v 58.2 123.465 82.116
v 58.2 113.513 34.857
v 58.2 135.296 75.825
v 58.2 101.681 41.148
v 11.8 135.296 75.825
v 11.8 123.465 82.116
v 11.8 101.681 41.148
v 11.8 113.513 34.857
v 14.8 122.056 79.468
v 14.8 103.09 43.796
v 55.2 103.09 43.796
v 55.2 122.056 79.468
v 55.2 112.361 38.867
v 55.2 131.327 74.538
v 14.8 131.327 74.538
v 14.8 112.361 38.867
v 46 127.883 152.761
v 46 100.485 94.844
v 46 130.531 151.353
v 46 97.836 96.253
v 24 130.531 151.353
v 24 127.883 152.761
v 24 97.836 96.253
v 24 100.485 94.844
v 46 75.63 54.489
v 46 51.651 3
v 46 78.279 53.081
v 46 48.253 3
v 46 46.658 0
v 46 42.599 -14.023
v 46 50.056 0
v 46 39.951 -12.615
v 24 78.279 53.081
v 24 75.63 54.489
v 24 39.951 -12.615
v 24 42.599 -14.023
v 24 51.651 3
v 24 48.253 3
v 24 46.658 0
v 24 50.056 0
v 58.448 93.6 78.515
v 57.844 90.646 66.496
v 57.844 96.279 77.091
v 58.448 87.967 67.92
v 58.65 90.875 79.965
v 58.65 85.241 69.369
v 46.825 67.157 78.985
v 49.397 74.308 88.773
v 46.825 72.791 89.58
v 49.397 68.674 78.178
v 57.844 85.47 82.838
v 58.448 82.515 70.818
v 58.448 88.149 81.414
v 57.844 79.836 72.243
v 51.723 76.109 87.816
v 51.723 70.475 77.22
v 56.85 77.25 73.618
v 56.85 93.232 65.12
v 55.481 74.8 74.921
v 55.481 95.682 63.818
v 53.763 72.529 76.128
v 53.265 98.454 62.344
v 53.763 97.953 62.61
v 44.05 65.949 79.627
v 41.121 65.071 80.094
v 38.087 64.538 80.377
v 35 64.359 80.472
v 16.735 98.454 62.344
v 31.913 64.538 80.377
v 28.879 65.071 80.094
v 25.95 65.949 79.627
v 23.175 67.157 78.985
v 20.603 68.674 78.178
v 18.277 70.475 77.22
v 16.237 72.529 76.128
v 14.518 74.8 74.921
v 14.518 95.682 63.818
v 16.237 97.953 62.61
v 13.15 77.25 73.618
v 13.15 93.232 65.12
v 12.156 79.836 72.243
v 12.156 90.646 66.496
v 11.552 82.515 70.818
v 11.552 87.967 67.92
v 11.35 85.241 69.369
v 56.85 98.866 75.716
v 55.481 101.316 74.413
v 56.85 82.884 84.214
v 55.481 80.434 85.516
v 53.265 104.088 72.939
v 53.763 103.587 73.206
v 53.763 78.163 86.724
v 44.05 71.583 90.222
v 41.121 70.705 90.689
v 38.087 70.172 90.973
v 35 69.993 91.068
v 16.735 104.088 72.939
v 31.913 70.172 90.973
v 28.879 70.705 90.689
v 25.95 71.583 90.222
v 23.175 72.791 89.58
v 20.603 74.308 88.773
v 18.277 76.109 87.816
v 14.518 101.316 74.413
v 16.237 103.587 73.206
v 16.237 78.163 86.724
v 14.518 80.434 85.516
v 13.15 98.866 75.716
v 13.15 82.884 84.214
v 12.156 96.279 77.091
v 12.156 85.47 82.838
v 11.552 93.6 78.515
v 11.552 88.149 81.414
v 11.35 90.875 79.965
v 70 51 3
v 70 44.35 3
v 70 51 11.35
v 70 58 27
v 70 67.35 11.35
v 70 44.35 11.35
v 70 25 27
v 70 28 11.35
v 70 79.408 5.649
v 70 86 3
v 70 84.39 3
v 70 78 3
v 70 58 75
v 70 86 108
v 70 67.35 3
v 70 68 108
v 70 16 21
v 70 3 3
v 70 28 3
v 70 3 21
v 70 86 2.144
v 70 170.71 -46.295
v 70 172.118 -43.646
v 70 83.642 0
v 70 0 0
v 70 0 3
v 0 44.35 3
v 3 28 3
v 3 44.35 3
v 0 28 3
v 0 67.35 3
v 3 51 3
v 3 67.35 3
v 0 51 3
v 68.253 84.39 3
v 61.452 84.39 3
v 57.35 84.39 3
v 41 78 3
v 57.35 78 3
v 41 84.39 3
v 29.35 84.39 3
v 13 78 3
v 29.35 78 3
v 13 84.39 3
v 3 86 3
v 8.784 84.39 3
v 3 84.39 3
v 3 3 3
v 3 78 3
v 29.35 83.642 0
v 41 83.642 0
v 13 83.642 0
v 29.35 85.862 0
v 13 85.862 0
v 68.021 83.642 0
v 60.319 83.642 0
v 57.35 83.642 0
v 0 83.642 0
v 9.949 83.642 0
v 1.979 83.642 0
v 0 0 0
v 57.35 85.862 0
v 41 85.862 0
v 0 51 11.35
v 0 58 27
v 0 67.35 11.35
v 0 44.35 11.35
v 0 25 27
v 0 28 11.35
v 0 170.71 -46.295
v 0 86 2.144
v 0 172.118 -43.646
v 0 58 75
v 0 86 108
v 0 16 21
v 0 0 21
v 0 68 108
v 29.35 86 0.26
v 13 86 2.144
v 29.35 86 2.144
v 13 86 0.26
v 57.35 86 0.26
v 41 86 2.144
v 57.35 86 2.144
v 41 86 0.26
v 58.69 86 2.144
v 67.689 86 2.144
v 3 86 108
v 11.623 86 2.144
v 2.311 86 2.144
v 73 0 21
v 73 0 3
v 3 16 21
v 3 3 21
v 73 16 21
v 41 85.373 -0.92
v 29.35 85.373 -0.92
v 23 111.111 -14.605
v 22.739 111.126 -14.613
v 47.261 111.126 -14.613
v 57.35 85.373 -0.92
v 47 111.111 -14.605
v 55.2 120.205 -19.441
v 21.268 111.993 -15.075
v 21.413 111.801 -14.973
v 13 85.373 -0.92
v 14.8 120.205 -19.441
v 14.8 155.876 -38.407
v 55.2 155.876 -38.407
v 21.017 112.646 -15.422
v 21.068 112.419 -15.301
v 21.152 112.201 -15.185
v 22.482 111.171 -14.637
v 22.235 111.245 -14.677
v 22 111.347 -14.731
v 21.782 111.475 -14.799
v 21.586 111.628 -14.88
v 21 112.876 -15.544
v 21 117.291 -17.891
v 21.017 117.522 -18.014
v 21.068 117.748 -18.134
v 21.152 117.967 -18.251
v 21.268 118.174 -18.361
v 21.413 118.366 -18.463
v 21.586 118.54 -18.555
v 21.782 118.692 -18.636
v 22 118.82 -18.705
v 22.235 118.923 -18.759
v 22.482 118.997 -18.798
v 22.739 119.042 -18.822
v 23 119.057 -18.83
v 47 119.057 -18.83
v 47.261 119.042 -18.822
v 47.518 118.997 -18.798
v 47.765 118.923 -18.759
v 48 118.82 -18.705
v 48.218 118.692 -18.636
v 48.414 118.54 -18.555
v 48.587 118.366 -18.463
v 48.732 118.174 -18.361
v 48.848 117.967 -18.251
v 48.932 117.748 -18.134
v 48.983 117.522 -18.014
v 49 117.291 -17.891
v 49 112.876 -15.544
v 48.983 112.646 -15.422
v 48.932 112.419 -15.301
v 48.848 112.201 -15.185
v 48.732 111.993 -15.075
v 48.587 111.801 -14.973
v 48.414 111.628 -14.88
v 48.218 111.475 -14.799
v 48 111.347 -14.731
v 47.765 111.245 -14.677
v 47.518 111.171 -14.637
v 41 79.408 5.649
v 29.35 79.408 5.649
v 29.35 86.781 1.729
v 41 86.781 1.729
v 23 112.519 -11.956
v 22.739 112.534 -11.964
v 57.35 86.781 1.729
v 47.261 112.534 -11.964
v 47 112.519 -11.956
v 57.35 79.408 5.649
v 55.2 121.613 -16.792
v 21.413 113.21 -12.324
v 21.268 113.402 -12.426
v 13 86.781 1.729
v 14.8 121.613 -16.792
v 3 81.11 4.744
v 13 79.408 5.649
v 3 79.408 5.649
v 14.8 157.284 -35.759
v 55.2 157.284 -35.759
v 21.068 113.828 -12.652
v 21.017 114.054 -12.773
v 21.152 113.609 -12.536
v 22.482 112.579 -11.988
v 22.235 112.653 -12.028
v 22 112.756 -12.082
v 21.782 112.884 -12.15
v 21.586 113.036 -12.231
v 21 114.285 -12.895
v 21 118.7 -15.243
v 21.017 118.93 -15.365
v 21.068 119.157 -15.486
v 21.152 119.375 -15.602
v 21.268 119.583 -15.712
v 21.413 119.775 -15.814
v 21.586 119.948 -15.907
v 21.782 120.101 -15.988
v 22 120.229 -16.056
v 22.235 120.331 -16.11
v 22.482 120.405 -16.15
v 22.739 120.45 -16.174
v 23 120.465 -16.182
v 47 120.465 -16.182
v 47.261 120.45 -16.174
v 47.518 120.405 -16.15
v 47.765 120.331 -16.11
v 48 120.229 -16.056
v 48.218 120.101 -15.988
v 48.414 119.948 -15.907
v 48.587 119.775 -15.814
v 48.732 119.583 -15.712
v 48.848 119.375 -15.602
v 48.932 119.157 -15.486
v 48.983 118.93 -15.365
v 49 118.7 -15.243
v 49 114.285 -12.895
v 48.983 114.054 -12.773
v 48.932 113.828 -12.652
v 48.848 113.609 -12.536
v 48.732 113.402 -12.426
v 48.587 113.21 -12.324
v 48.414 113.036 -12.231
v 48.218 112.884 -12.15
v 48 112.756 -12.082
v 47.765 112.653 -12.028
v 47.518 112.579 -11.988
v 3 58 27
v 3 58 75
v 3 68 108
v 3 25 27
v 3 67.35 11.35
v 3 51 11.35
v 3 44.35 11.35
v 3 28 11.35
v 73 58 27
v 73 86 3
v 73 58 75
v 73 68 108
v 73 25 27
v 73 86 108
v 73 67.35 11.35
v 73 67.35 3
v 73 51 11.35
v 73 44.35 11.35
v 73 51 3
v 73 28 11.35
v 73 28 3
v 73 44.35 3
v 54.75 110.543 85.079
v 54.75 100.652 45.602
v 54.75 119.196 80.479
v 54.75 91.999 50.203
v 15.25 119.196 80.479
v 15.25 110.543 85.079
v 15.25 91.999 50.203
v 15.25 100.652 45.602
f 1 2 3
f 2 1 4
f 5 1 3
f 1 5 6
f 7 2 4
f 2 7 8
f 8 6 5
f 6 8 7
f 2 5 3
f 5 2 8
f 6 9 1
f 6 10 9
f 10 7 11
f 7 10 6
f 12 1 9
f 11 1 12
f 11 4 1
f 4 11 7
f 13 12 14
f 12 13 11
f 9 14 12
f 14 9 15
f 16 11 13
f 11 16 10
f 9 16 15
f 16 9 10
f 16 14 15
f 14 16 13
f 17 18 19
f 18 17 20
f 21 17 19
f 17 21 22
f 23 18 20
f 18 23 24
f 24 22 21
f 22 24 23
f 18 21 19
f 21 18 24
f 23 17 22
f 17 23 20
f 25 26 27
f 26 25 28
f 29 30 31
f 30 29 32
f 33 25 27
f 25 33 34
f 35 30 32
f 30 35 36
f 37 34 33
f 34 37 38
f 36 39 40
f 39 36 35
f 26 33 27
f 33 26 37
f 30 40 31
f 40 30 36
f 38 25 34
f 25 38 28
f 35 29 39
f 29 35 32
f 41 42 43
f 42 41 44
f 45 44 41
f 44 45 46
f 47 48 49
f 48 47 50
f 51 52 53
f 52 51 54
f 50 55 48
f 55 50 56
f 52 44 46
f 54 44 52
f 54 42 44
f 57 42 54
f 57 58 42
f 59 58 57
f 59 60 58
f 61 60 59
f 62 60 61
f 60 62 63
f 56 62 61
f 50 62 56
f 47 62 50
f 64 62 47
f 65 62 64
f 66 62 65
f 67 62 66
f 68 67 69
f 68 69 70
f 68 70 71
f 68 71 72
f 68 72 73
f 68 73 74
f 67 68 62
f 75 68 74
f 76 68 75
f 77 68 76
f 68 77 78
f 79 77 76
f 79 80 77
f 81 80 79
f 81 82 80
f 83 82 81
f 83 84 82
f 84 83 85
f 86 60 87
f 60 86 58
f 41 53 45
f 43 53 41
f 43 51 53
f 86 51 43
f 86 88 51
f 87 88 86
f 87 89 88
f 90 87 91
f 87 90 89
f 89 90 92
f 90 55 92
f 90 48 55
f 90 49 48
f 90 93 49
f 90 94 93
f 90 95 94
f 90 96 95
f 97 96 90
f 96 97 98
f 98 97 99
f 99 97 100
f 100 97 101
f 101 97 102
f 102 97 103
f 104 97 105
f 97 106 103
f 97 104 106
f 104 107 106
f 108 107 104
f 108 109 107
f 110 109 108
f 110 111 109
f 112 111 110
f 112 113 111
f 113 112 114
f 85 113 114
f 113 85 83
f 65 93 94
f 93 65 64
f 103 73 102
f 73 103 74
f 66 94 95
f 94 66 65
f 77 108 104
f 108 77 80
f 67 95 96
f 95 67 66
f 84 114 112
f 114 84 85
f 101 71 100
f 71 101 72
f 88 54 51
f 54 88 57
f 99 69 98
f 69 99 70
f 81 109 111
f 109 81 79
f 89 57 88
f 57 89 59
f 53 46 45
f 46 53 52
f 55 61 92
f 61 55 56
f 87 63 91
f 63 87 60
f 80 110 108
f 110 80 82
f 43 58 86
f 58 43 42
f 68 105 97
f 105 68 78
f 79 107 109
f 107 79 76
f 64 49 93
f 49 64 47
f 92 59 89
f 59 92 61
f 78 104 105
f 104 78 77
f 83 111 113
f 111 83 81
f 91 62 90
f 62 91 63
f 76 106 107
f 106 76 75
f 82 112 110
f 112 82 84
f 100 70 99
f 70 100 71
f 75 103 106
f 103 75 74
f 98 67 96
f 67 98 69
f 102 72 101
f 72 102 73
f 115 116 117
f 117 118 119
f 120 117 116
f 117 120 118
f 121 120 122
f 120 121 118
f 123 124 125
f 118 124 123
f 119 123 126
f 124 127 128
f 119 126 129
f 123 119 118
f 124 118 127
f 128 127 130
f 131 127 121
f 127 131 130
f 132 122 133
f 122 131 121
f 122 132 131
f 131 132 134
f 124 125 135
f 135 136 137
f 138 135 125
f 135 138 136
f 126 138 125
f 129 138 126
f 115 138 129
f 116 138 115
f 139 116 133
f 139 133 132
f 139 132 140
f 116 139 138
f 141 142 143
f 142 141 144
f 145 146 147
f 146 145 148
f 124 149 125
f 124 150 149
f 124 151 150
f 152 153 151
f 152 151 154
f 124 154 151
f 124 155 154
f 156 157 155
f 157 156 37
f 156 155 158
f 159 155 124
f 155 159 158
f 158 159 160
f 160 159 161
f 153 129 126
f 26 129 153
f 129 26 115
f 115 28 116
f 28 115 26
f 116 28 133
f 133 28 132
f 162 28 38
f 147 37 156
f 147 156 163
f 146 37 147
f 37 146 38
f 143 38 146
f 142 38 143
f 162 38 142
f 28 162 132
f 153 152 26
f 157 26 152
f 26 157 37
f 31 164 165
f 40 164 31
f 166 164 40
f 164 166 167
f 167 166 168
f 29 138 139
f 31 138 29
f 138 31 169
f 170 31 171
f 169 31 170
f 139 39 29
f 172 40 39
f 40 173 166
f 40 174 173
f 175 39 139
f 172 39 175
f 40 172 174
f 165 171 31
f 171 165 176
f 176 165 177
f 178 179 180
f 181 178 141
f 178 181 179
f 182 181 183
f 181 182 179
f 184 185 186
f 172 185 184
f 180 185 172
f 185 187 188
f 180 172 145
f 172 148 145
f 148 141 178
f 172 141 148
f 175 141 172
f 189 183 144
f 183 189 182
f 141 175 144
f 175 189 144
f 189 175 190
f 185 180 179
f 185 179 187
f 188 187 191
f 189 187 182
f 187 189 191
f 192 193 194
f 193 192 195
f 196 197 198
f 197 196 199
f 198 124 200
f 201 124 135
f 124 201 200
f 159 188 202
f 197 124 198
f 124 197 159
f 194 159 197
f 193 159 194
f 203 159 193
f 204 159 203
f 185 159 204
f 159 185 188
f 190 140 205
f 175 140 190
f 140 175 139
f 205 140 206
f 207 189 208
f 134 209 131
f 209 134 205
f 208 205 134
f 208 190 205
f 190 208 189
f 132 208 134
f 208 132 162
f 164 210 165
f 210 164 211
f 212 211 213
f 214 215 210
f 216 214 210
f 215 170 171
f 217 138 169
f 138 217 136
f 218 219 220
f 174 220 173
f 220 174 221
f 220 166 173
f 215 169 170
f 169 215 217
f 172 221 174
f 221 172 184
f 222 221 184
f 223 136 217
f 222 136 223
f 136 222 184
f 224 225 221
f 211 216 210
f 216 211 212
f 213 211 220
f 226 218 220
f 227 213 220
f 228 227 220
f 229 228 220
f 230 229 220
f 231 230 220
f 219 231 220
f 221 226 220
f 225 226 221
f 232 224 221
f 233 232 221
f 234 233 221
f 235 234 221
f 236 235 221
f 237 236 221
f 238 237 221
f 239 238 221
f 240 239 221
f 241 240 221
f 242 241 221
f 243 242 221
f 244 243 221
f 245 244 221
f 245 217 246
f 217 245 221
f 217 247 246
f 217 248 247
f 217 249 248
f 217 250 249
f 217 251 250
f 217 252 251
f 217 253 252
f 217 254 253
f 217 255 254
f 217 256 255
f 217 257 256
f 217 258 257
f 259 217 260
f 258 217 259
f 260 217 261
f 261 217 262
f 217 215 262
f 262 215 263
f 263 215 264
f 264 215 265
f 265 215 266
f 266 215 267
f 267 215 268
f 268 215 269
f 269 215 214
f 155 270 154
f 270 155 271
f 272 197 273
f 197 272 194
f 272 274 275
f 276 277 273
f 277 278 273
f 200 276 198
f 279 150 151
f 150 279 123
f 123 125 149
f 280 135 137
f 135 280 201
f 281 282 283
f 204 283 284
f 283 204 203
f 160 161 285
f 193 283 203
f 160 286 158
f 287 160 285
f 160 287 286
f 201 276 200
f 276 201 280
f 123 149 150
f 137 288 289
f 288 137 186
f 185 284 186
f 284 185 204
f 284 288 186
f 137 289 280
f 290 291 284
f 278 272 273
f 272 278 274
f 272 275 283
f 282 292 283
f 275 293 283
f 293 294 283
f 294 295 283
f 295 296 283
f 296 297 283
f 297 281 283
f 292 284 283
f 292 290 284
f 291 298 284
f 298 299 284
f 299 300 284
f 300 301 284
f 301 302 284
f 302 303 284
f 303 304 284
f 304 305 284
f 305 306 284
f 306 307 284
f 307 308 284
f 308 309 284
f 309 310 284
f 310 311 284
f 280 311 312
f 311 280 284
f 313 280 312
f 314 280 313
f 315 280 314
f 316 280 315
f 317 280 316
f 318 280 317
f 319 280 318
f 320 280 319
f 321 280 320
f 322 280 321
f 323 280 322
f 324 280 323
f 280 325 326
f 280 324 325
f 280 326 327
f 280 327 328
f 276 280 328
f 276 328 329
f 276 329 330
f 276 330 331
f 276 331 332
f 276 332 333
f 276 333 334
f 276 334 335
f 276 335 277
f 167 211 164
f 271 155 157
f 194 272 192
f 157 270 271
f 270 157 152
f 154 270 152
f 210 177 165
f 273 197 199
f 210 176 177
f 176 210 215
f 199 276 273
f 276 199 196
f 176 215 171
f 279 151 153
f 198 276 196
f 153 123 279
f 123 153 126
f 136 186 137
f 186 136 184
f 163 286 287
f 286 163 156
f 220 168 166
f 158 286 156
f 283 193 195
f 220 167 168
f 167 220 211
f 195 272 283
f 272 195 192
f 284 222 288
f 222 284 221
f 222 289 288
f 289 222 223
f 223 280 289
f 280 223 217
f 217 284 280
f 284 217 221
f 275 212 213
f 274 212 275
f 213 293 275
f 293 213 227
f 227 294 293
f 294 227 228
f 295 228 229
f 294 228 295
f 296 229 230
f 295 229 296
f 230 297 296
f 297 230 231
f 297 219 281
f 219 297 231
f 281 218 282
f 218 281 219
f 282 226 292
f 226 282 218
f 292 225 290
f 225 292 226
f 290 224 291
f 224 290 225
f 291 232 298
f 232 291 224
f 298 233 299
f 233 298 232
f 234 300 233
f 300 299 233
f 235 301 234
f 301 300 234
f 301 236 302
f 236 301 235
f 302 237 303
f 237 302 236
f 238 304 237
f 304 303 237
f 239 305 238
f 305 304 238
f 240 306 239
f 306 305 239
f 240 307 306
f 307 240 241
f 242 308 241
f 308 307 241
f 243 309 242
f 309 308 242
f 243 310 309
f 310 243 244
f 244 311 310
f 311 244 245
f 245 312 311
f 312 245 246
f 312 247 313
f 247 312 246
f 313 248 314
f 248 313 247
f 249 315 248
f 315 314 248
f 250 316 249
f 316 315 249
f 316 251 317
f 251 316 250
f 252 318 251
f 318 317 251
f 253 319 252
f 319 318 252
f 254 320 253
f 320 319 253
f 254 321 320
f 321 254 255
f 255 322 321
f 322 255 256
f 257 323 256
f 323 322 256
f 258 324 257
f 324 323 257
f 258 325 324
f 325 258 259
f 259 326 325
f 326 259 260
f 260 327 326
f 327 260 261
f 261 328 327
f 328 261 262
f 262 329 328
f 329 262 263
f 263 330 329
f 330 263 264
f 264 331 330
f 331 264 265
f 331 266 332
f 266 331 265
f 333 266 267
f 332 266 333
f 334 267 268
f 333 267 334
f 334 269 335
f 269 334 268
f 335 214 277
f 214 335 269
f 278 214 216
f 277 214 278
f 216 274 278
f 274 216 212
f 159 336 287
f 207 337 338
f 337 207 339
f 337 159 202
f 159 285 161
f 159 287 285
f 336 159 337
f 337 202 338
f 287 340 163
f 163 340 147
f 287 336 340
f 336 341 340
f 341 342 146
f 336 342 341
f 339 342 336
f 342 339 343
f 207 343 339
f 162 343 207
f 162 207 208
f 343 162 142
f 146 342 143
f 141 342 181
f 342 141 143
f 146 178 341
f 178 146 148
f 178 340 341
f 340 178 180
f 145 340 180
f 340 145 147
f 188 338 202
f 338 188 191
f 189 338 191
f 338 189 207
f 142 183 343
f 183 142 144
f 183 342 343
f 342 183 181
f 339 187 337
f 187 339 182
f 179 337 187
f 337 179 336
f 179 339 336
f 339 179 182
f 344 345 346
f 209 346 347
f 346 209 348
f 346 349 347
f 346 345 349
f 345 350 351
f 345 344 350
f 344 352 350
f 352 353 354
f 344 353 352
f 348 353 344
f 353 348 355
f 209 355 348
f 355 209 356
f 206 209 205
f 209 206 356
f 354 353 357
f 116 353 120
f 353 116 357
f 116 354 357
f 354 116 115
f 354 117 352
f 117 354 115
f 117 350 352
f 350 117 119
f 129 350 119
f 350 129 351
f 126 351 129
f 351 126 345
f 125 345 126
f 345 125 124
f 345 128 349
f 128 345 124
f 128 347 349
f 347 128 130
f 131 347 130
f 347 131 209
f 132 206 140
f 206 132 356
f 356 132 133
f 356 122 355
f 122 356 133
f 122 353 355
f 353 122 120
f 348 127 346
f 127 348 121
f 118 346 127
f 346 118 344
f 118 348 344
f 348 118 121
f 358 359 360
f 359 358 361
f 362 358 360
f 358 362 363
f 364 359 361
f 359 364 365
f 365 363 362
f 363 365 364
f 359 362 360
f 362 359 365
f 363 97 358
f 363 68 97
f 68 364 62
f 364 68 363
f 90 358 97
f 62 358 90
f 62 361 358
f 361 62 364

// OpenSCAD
/*
Xiaomi Watch S4 Cardboard Docking Station
하드보드지/폼보드용 파라메트릭 도킹스테이션 설계

권장 뷰어:
- OpenSCAD
- 또는 FreeCAD / MakerWorld / 기타 SCAD 호환 뷰어

단위: mm

핵심 제원:
- Xiaomi Watch S4 본체: 47.3 x 47.3 x 12.0
- 심박 센서 범프 포함 두께: 14.13
- 충전 독: 39.5 x 39.5 x 9.8
- 설계 충전 독 포켓: 40.4 x 40.4 x 10.4
- 하드보드지 두께: 3.0
*/

$fn = 48;

// ===========================
// 0. 사용자 조정 파라미터
// ===========================

mode = "assembly"; 
// "assembly" : 조립 상태 미리보기
// "cut_layout" : 재단 평면도 미리보기
// "front_panel" : 전면 패널만 보기
// "back_panel" : 후면 패널만 보기
// "side_panel" : 측면 패널만 보기
// "base_panel" : 바닥 패널만 보기

board_t = 3.0;

// 실제 기기 제원
watch_diameter = 47.3;
watch_body_thickness = 12.0;
watch_sensor_thickness = 14.13;

charger_w = 39.5;
charger_d = 39.5;
charger_t = 9.8;

// 제작 공차
clearance = 0.45;       // 하드보드지 수작업 절단용 여유
slot_clearance = 0.7;

// 설계 치수
dock_w = 70;
dock_depth = 86;
dock_h = 105;

back_angle = 62;        // 바닥 기준 뒤로 누운 각도. 60~65 권장.
front_lip_h = 18;
front_lip_t = board_t;

charger_pocket_w = charger_w + clearance * 2;
charger_pocket_h = charger_d + clearance * 2;
charger_pocket_depth = charger_t + 0.6;

charger_center_z = 68;  // 바닥에서 충전기 중심 높이
strap_slot_w = 28;
strap_slot_h = 9;
strap_slot_center_z = 42;

cable_hole_d = 12;
cable_channel_w = 7;
cable_channel_bottom_gap = 5;

// 시계 안정화용 얕은 원형 받침 홈
watch_cradle_d = watch_diameter + 1.5;
watch_cradle_depth = 1.0;

// 조립 슬롯
tab_w = 16;
tab_h = 8;
tab_clearance = 0.35;

// ===========================
// 1. 유틸리티
// ===========================

module rounded_rect_2d(w, h, r = 2) {
    hull() {
        translate([r, r]) circle(r);
        translate([w-r, r]) circle(r);
        translate([w-r, h-r]) circle(r);
        translate([r, h-r]) circle(r);
    }
}

module panel_3d(w, h, t = board_t) {
    cube([w, t, h], center=false);
}

module cardboard_color() {
    color([0.70, 0.52, 0.32, 1.0]) children();
}

module cutout_color() {
    color([0.95, 0.95, 0.95, 1.0]) children();
}

module charger_dummy() {
    color([0.15, 0.15, 0.15, 1.0])
        cube([charger_w, charger_t, charger_d], center=true);
}

module watch_dummy() {
    // 실제 시계와 충전기 위치 검증용 더미
    color([0.03, 0.03, 0.03, 0.85])
        translate([0, -watch_sensor_thickness/2 - charger_t/2 - 1, 0])
            cylinder(d=watch_diameter, h=watch_body_thickness, center=true);

    color([0.01, 0.01, 0.01, 0.55]) {
        // 위 스트랩
        translate([0, -watch_sensor_thickness/2 - charger_t/2 - 1, watch_diameter/2 + 32])
            cube([22, 3, 64], center=true);
        // 아래 스트랩
        translate([0, -watch_sensor_thickness/2 - charger_t/2 - 1, -watch_diameter/2 - 38])
            cube([22, 3, 76], center=true);
    }
}

// ===========================
// 2. 전면 기울어진 패널
// ===========================

module front_panel_shape_2d() {
    difference() {
        square([dock_w, dock_h], center=false);

        // 충전 독 사각 포켓 관통 기준선
        translate([
            dock_w/2 - charger_pocket_w/2,
            charger_center_z - charger_pocket_h/2
        ])
            square([charger_pocket_w, charger_pocket_h], center=false);

        // 스트랩 통과 슬롯
        translate([
            dock_w/2 - strap_slot_w/2,
            strap_slot_center_z - strap_slot_h/2
        ])
            rounded_rect_2d(strap_slot_w, strap_slot_h, 2);

        // 하단 조립 탭 슬롯 2개
        translate([13, 0])
            square([tab_w + tab_clearance, tab_h + tab_clearance], center=false);
        translate([dock_w - 13 - tab_w, 0])
            square([tab_w + tab_clearance, tab_h + tab_clearance], center=false);
    }
}

module front_panel_3d() {
    cardboard_color()
    linear_extrude(height=board_t)
        front_panel_shape_2d();
}

// 충전 독이 너무 튀어나오지 않도록, 앞판 뒤쪽에 붙일 포켓 박스
module charger_pocket_box() {
    pocket_outer_w = charger_pocket_w + board_t * 2;
    pocket_outer_h = charger_pocket_h + board_t * 2;

    cardboard_color()
    difference() {
        translate([-pocket_outer_w/2, 0, -pocket_outer_h/2])
            cube([pocket_outer_w, charger_pocket_depth + board_t, pocket_outer_h], center=false);
        translate([-charger_pocket_w/2, -0.1, -charger_pocket_h/2])
            cube([charger_pocket_w, charger_pocket_depth + 0.2, charger_pocket_h], center=false);
    }
}

// ===========================
// 3. 후면 패널: 케이블 구멍/채널
// ===========================

module back_panel_shape_2d() {
    difference() {
        square([dock_w, dock_h], center=false);

        // 케이블 구멍
        translate([dock_w/2, charger_center_z])
            circle(d=cable_hole_d);

        // 케이블 채널
        translate([
            dock_w/2 - cable_channel_w/2,
            cable_channel_bottom_gap
        ])
            rounded_rect_2d(
                cable_channel_w,
                charger_center_z - cable_hole_d/2 - cable_channel_bottom_gap,
                2
            );

        // 하단 조립 탭 슬롯
        translate([13, 0])
            square([tab_w + tab_clearance, tab_h + tab_clearance], center=false);
        translate([dock_w - 13 - tab_w, 0])
            square([tab_w + tab_clearance, tab_h + tab_clearance], center=false);
    }
}

module back_panel_3d() {
    cardboard_color()
    linear_extrude(height=board_t)
        back_panel_shape_2d();
}

// ===========================
// 4. 측면 삼각 지지대
// ===========================

module side_panel_shape_2d() {
    /*
    측면 지지대는 앞판 각도를 잡는 핵심 부품.
    바닥 길이 dock_depth, 높이 dock_h.
    앞쪽 낮은 립/전면 받침과 뒤쪽 등받이를 이어주는 삼각형 구조.
    */
    difference() {
        polygon(points=[
            [0,0],
            [dock_depth,0],
            [dock_depth,dock_h],
            [dock_depth-18,dock_h],
            [16,front_lip_h],
            [0,front_lip_h]
        ]);

        // 무게 줄이기용 삼각 타공, 필수 아님
        polygon(points=[
            [25,24],
            [58,24],
            [58,72]
        ]);

        // 바닥 결합 탭 슬롯
        translate([28, 0])
            square([tab_w + tab_clearance, tab_h + tab_clearance], center=false);
        translate([dock_depth - 35, 0])
            square([tab_w + tab_clearance, tab_h + tab_clearance], center=false);
    }
}

module side_panel_3d() {
    cardboard_color()
    linear_extrude(height=board_t)
        side_panel_shape_2d();
}

// ===========================
// 5. 바닥 패널, 앞 립
// ===========================

module base_panel_3d() {
    cardboard_color()
    cube([dock_w, dock_depth, board_t], center=false);
}

module front_lip_3d() {
    cardboard_color()
    cube([dock_w, board_t, front_lip_h], center=false);
}

// ===========================
// 6. 조립 상태
// ===========================

module assembly() {
    // 바닥
    base_panel_3d();

    // 앞쪽 립
    translate([0, 0, board_t])
        front_lip_3d();

    // 기울어진 전면 패널
    // y-z 평면에 세우기 위해 rotate 후 위치 조정
    translate([0, dock_depth - 8, board_t])
        rotate([back_angle - 90, 0, 0])
            front_panel_3d();

    // 후면 케이블 가이드 패널, 전면 패널과 거의 평행하게 뒤쪽에 배치
    translate([0, dock_depth - 18, board_t])
        rotate([back_angle - 90, 0, 0])
            back_panel_3d();

    // 충전 독 포켓 박스, 전면 패널 뒤쪽
    translate([dock_w/2, dock_depth - 8, board_t])
        rotate([back_angle - 90, 0, 0])
            translate([0, board_t, charger_center_z])
                charger_pocket_box();

    // 좌우 측면 지지대
    translate([0, 0, board_t])
        rotate([90, 0, 90])
            side_panel_3d();

    translate([dock_w, 0, board_t])
        rotate([90, 0, 90])
            side_panel_3d();

    // 충전기 더미
    translate([dock_w/2, dock_depth - 8, board_t])
        rotate([back_angle - 90, 0, 0])
            translate([0, -charger_t/2, charger_center_z])
                charger_dummy();

    // 시계 더미
    translate([dock_w/2, dock_depth - 8, board_t])
        rotate([back_angle - 90, 0, 0])
            translate([0, -charger_t - 2, charger_center_z])
                watch_dummy();
}

// ===========================
// 7. 재단 평면도
// ===========================

module flat_panel(label_text = "") {
    // OpenSCAD 자체 텍스트는 폰트 환경 타서 깨질 수 있어 최소 사용
    children();
}

module cut_layout() {
    gap = 18;

    // 전면 패널
    translate([0,0,0])
        linear_extrude(height=0.6)
            front_panel_shape_2d();

    // 후면 패널
    translate([dock_w + gap, 0, 0])
        linear_extrude(height=0.6)
            back_panel_shape_2d();

    // 좌측 지지대
    translate([0, dock_h + gap, 0])
        linear_extrude(height=0.6)
            side_panel_shape_2d();

    // 우측 지지대
    translate([dock_depth + gap, dock_h + gap, 0])
        linear_extrude(height=0.6)
            mirror([1,0,0])
                side_panel_shape_2d();

    // 바닥 패널
    translate([dock_w*2 + gap*2, 0, 0])
        linear_extrude(height=0.6)
            square([dock_w, dock_depth], center=false);

    // 앞 립
    translate([dock_w*2 + gap*2, dock_depth + gap, 0])
        linear_extrude(height=0.6)
            square([dock_w, front_lip_h], center=false);
}

// ===========================
// 8. 모드 선택
// ===========================

if (mode == "assembly") {
    assembly();
} else if (mode == "cut_layout") {
    cut_layout();
} else if (mode == "front_panel") {
    front_panel_3d();
} else if (mode == "back_panel") {
    back_panel_3d();
} else if (mode == "side_panel") {
    side_panel_3d();
} else if (mode == "base_panel") {
    base_panel_3d();
}
